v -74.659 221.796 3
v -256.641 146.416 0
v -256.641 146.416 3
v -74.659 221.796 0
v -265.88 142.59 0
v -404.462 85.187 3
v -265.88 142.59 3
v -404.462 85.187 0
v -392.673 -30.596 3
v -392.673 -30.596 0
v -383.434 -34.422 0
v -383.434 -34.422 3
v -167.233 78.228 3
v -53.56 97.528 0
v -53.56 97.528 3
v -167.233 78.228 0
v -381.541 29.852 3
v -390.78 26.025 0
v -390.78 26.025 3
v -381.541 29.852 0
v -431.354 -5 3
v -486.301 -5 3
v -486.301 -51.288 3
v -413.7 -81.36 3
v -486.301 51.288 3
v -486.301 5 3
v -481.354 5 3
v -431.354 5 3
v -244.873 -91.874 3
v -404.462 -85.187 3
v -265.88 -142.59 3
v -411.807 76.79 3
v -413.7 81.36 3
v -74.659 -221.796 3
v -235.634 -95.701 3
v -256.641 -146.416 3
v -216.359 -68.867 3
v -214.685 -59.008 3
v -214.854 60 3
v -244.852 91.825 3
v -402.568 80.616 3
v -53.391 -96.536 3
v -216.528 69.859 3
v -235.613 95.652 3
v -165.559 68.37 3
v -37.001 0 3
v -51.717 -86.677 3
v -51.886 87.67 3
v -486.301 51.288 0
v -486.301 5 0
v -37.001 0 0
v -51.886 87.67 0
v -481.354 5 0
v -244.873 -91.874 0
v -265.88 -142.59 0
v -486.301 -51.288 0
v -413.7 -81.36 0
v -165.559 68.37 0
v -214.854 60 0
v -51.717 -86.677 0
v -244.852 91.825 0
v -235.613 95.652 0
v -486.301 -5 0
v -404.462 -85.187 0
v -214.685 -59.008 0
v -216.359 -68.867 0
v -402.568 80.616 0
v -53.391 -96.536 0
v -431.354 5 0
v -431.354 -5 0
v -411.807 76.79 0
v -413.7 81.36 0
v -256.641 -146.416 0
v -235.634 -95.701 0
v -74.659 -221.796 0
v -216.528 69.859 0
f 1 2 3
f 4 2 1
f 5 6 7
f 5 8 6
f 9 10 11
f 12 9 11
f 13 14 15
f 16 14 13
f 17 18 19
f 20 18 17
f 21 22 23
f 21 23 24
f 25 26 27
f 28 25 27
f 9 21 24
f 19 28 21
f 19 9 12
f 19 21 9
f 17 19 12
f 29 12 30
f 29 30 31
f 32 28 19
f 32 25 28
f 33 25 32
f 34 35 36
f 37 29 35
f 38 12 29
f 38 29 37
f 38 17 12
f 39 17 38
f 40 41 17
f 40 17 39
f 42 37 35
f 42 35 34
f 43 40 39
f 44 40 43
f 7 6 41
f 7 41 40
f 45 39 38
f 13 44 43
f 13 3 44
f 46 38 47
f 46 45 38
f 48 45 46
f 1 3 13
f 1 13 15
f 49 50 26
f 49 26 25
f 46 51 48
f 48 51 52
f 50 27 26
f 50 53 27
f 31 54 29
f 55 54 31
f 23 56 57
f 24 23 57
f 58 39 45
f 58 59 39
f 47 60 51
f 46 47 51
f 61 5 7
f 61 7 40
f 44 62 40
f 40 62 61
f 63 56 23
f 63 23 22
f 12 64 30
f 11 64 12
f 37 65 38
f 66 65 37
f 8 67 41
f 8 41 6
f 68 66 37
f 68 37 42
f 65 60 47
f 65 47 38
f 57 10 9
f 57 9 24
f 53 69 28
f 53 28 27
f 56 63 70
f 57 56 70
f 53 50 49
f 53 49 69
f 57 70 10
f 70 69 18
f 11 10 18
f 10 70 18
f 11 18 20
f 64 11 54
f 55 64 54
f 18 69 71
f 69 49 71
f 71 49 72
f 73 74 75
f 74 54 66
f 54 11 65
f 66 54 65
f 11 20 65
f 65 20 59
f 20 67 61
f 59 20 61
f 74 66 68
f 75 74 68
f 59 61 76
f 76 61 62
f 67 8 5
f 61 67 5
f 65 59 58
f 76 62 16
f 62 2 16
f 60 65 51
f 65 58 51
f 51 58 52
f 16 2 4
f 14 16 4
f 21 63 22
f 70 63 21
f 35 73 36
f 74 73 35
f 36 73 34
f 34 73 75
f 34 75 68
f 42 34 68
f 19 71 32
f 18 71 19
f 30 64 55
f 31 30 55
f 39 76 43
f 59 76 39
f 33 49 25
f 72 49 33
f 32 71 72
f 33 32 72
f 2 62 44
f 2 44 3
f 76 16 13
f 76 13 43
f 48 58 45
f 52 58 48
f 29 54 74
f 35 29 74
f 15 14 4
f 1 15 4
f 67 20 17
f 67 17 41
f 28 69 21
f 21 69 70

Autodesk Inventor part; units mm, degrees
ref_plane "YZ Plane" through (0, 0, 0) normal (1, 0, 0) x (0, 1, 0)
ref_plane "XZ Plane" through (0, 0, 0) normal (0, 1, 0) x (-1, 0, 0)
ref_plane "Work Plane1" through (0, 0, 0) normal (0, 0, 1) x (1, 0, 0)
sketch "Sketch1" plane through (0, 0, 0) normal (0, 0, 1) x (1, 0, 0)
  line L0 (-79.5271, 221.8978) -> (-38.5876, 0.7641) construction
  line L1 (-214.8536, 60) -> (-51.8859, 87.6696) projected
  line L2 (-53.5598, 97.5285) -> (-216.5275, 69.8589) projected
  line L3 (-216.5275, 69.8589) -> (-214.8536, 60) projected
  line L4 (-265.8796, 142.5897) -> (-244.8522, 91.8249) projected
  line L5 (-235.6134, 95.6518) -> (-256.6408, 146.4165) projected
  line L6 (-235.6134, 95.6518) -> (-244.8522, 91.8249) projected
  line L7 (-413.7003, -81.3604) -> (-404.4616, -85.1872) construction
  line L8 (-392.6729, -30.5956) -> (-413.7003, -81.3604) projected
  line L9 (-404.4616, -85.1872) -> (-383.4341, -34.4224) projected
  line L10 (-244.8727, -91.8744) -> (-265.9001, -142.6392) projected
  line L11 (-265.9001, -142.6392) -> (-256.6613, -146.466) construction
  line L12 (-256.6613, -146.466) -> (-235.6339, -95.7013) projected
  line L13 (-486.3009, 5) -> (-486.3009, -5) construction
  line L14 (-486.3009, -5) -> (-431.3536, -5) projected
  line L15 (-431.3536, 5) -> (-486.3009, 5) projected
  line L16 (-431.3536, 5) -> (-431.3536, -5) projected
  line L17 (-411.8071, 76.7896) -> (-402.5683, 80.6164) construction
  line L18 (-411.8071, 76.7896) -> (-390.7796, 26.0248) projected
  line L19 (-381.5408, 29.8516) -> (-402.5683, 80.6164) projected
  line L20 (-390.7796, 26.0248) -> (-381.5408, 29.8516) projected
  line L21 (-256.6408, 146.4165) -> (-265.8796, 142.5897) construction
  line L22 (-167.233, 78.2284) -> (-53.5598, 97.5285) projected
  line L23 (-51.8859, 87.6696) -> (-165.5591, 68.3695) projected
  line L24 (-53.5598, 97.5285) -> (-51.8859, 87.6696) construction
  line L25 (-51.7174, -86.6773) -> (-214.6851, -59.0077) projected
  line L26 (-51.7174, -86.6773) -> (-53.3913, -96.5362) construction
  line L27 (-216.359, -68.8666) -> (-53.3913, -96.5362) projected
  line L28 (-214.6851, -59.0077) -> (-216.359, -68.8666) projected
  line L29 (-392.6729, -30.5956) -> (-383.4341, -34.4224) projected
  line L30 (-244.8727, -91.8744) -> (-235.6339, -95.7013) projected
  line L31 (-481.3536, 5) -> (-431.3536, 5) projected
  line L32 (-486.3009, -51.2882) -> (-413.7003, -81.3604)
  line L33 (-486.3009, -51.2882) -> (-486.3009, -5)
  line L34 (-486.3009, 5) -> (-486.3009, 51.2882)
  line L35 (-256.6408, 146.4165) -> (-74.6586, 221.796)
  line L36 (-37.0008, 0) -> (-51.8859, 87.6696)
  line L37 (-53.5598, 97.5285) -> (-74.6586, 221.796)
  line L38 (-74.6586, -221.796) -> (-53.3913, -96.5362)
  line L39 (-51.7174, -86.6773) -> (-37.0008, 0)
  line L40 (-404.4616, -85.1872) -> (-265.8796, -142.5897)
  line L41 (-256.6408, -146.4165) -> (-74.6586, -221.796)
  line L42 (-411.8071, 76.7896) -> (-413.7003, 81.3604)
  line L43 (-402.5683, 80.6164) -> (-404.4616, 85.1872)
  line L44 (-486.3009, 51.2882) -> (-413.7003, 81.3604)
  line L45 (-404.4616, 85.1872) -> (-265.8796, 142.5897)
  point P0 (0, 0)
extrude "Extrusion1" add sketch "Sketch1" along normal blind 3
properties part number "refbot" material "Wood (Cherry)"
